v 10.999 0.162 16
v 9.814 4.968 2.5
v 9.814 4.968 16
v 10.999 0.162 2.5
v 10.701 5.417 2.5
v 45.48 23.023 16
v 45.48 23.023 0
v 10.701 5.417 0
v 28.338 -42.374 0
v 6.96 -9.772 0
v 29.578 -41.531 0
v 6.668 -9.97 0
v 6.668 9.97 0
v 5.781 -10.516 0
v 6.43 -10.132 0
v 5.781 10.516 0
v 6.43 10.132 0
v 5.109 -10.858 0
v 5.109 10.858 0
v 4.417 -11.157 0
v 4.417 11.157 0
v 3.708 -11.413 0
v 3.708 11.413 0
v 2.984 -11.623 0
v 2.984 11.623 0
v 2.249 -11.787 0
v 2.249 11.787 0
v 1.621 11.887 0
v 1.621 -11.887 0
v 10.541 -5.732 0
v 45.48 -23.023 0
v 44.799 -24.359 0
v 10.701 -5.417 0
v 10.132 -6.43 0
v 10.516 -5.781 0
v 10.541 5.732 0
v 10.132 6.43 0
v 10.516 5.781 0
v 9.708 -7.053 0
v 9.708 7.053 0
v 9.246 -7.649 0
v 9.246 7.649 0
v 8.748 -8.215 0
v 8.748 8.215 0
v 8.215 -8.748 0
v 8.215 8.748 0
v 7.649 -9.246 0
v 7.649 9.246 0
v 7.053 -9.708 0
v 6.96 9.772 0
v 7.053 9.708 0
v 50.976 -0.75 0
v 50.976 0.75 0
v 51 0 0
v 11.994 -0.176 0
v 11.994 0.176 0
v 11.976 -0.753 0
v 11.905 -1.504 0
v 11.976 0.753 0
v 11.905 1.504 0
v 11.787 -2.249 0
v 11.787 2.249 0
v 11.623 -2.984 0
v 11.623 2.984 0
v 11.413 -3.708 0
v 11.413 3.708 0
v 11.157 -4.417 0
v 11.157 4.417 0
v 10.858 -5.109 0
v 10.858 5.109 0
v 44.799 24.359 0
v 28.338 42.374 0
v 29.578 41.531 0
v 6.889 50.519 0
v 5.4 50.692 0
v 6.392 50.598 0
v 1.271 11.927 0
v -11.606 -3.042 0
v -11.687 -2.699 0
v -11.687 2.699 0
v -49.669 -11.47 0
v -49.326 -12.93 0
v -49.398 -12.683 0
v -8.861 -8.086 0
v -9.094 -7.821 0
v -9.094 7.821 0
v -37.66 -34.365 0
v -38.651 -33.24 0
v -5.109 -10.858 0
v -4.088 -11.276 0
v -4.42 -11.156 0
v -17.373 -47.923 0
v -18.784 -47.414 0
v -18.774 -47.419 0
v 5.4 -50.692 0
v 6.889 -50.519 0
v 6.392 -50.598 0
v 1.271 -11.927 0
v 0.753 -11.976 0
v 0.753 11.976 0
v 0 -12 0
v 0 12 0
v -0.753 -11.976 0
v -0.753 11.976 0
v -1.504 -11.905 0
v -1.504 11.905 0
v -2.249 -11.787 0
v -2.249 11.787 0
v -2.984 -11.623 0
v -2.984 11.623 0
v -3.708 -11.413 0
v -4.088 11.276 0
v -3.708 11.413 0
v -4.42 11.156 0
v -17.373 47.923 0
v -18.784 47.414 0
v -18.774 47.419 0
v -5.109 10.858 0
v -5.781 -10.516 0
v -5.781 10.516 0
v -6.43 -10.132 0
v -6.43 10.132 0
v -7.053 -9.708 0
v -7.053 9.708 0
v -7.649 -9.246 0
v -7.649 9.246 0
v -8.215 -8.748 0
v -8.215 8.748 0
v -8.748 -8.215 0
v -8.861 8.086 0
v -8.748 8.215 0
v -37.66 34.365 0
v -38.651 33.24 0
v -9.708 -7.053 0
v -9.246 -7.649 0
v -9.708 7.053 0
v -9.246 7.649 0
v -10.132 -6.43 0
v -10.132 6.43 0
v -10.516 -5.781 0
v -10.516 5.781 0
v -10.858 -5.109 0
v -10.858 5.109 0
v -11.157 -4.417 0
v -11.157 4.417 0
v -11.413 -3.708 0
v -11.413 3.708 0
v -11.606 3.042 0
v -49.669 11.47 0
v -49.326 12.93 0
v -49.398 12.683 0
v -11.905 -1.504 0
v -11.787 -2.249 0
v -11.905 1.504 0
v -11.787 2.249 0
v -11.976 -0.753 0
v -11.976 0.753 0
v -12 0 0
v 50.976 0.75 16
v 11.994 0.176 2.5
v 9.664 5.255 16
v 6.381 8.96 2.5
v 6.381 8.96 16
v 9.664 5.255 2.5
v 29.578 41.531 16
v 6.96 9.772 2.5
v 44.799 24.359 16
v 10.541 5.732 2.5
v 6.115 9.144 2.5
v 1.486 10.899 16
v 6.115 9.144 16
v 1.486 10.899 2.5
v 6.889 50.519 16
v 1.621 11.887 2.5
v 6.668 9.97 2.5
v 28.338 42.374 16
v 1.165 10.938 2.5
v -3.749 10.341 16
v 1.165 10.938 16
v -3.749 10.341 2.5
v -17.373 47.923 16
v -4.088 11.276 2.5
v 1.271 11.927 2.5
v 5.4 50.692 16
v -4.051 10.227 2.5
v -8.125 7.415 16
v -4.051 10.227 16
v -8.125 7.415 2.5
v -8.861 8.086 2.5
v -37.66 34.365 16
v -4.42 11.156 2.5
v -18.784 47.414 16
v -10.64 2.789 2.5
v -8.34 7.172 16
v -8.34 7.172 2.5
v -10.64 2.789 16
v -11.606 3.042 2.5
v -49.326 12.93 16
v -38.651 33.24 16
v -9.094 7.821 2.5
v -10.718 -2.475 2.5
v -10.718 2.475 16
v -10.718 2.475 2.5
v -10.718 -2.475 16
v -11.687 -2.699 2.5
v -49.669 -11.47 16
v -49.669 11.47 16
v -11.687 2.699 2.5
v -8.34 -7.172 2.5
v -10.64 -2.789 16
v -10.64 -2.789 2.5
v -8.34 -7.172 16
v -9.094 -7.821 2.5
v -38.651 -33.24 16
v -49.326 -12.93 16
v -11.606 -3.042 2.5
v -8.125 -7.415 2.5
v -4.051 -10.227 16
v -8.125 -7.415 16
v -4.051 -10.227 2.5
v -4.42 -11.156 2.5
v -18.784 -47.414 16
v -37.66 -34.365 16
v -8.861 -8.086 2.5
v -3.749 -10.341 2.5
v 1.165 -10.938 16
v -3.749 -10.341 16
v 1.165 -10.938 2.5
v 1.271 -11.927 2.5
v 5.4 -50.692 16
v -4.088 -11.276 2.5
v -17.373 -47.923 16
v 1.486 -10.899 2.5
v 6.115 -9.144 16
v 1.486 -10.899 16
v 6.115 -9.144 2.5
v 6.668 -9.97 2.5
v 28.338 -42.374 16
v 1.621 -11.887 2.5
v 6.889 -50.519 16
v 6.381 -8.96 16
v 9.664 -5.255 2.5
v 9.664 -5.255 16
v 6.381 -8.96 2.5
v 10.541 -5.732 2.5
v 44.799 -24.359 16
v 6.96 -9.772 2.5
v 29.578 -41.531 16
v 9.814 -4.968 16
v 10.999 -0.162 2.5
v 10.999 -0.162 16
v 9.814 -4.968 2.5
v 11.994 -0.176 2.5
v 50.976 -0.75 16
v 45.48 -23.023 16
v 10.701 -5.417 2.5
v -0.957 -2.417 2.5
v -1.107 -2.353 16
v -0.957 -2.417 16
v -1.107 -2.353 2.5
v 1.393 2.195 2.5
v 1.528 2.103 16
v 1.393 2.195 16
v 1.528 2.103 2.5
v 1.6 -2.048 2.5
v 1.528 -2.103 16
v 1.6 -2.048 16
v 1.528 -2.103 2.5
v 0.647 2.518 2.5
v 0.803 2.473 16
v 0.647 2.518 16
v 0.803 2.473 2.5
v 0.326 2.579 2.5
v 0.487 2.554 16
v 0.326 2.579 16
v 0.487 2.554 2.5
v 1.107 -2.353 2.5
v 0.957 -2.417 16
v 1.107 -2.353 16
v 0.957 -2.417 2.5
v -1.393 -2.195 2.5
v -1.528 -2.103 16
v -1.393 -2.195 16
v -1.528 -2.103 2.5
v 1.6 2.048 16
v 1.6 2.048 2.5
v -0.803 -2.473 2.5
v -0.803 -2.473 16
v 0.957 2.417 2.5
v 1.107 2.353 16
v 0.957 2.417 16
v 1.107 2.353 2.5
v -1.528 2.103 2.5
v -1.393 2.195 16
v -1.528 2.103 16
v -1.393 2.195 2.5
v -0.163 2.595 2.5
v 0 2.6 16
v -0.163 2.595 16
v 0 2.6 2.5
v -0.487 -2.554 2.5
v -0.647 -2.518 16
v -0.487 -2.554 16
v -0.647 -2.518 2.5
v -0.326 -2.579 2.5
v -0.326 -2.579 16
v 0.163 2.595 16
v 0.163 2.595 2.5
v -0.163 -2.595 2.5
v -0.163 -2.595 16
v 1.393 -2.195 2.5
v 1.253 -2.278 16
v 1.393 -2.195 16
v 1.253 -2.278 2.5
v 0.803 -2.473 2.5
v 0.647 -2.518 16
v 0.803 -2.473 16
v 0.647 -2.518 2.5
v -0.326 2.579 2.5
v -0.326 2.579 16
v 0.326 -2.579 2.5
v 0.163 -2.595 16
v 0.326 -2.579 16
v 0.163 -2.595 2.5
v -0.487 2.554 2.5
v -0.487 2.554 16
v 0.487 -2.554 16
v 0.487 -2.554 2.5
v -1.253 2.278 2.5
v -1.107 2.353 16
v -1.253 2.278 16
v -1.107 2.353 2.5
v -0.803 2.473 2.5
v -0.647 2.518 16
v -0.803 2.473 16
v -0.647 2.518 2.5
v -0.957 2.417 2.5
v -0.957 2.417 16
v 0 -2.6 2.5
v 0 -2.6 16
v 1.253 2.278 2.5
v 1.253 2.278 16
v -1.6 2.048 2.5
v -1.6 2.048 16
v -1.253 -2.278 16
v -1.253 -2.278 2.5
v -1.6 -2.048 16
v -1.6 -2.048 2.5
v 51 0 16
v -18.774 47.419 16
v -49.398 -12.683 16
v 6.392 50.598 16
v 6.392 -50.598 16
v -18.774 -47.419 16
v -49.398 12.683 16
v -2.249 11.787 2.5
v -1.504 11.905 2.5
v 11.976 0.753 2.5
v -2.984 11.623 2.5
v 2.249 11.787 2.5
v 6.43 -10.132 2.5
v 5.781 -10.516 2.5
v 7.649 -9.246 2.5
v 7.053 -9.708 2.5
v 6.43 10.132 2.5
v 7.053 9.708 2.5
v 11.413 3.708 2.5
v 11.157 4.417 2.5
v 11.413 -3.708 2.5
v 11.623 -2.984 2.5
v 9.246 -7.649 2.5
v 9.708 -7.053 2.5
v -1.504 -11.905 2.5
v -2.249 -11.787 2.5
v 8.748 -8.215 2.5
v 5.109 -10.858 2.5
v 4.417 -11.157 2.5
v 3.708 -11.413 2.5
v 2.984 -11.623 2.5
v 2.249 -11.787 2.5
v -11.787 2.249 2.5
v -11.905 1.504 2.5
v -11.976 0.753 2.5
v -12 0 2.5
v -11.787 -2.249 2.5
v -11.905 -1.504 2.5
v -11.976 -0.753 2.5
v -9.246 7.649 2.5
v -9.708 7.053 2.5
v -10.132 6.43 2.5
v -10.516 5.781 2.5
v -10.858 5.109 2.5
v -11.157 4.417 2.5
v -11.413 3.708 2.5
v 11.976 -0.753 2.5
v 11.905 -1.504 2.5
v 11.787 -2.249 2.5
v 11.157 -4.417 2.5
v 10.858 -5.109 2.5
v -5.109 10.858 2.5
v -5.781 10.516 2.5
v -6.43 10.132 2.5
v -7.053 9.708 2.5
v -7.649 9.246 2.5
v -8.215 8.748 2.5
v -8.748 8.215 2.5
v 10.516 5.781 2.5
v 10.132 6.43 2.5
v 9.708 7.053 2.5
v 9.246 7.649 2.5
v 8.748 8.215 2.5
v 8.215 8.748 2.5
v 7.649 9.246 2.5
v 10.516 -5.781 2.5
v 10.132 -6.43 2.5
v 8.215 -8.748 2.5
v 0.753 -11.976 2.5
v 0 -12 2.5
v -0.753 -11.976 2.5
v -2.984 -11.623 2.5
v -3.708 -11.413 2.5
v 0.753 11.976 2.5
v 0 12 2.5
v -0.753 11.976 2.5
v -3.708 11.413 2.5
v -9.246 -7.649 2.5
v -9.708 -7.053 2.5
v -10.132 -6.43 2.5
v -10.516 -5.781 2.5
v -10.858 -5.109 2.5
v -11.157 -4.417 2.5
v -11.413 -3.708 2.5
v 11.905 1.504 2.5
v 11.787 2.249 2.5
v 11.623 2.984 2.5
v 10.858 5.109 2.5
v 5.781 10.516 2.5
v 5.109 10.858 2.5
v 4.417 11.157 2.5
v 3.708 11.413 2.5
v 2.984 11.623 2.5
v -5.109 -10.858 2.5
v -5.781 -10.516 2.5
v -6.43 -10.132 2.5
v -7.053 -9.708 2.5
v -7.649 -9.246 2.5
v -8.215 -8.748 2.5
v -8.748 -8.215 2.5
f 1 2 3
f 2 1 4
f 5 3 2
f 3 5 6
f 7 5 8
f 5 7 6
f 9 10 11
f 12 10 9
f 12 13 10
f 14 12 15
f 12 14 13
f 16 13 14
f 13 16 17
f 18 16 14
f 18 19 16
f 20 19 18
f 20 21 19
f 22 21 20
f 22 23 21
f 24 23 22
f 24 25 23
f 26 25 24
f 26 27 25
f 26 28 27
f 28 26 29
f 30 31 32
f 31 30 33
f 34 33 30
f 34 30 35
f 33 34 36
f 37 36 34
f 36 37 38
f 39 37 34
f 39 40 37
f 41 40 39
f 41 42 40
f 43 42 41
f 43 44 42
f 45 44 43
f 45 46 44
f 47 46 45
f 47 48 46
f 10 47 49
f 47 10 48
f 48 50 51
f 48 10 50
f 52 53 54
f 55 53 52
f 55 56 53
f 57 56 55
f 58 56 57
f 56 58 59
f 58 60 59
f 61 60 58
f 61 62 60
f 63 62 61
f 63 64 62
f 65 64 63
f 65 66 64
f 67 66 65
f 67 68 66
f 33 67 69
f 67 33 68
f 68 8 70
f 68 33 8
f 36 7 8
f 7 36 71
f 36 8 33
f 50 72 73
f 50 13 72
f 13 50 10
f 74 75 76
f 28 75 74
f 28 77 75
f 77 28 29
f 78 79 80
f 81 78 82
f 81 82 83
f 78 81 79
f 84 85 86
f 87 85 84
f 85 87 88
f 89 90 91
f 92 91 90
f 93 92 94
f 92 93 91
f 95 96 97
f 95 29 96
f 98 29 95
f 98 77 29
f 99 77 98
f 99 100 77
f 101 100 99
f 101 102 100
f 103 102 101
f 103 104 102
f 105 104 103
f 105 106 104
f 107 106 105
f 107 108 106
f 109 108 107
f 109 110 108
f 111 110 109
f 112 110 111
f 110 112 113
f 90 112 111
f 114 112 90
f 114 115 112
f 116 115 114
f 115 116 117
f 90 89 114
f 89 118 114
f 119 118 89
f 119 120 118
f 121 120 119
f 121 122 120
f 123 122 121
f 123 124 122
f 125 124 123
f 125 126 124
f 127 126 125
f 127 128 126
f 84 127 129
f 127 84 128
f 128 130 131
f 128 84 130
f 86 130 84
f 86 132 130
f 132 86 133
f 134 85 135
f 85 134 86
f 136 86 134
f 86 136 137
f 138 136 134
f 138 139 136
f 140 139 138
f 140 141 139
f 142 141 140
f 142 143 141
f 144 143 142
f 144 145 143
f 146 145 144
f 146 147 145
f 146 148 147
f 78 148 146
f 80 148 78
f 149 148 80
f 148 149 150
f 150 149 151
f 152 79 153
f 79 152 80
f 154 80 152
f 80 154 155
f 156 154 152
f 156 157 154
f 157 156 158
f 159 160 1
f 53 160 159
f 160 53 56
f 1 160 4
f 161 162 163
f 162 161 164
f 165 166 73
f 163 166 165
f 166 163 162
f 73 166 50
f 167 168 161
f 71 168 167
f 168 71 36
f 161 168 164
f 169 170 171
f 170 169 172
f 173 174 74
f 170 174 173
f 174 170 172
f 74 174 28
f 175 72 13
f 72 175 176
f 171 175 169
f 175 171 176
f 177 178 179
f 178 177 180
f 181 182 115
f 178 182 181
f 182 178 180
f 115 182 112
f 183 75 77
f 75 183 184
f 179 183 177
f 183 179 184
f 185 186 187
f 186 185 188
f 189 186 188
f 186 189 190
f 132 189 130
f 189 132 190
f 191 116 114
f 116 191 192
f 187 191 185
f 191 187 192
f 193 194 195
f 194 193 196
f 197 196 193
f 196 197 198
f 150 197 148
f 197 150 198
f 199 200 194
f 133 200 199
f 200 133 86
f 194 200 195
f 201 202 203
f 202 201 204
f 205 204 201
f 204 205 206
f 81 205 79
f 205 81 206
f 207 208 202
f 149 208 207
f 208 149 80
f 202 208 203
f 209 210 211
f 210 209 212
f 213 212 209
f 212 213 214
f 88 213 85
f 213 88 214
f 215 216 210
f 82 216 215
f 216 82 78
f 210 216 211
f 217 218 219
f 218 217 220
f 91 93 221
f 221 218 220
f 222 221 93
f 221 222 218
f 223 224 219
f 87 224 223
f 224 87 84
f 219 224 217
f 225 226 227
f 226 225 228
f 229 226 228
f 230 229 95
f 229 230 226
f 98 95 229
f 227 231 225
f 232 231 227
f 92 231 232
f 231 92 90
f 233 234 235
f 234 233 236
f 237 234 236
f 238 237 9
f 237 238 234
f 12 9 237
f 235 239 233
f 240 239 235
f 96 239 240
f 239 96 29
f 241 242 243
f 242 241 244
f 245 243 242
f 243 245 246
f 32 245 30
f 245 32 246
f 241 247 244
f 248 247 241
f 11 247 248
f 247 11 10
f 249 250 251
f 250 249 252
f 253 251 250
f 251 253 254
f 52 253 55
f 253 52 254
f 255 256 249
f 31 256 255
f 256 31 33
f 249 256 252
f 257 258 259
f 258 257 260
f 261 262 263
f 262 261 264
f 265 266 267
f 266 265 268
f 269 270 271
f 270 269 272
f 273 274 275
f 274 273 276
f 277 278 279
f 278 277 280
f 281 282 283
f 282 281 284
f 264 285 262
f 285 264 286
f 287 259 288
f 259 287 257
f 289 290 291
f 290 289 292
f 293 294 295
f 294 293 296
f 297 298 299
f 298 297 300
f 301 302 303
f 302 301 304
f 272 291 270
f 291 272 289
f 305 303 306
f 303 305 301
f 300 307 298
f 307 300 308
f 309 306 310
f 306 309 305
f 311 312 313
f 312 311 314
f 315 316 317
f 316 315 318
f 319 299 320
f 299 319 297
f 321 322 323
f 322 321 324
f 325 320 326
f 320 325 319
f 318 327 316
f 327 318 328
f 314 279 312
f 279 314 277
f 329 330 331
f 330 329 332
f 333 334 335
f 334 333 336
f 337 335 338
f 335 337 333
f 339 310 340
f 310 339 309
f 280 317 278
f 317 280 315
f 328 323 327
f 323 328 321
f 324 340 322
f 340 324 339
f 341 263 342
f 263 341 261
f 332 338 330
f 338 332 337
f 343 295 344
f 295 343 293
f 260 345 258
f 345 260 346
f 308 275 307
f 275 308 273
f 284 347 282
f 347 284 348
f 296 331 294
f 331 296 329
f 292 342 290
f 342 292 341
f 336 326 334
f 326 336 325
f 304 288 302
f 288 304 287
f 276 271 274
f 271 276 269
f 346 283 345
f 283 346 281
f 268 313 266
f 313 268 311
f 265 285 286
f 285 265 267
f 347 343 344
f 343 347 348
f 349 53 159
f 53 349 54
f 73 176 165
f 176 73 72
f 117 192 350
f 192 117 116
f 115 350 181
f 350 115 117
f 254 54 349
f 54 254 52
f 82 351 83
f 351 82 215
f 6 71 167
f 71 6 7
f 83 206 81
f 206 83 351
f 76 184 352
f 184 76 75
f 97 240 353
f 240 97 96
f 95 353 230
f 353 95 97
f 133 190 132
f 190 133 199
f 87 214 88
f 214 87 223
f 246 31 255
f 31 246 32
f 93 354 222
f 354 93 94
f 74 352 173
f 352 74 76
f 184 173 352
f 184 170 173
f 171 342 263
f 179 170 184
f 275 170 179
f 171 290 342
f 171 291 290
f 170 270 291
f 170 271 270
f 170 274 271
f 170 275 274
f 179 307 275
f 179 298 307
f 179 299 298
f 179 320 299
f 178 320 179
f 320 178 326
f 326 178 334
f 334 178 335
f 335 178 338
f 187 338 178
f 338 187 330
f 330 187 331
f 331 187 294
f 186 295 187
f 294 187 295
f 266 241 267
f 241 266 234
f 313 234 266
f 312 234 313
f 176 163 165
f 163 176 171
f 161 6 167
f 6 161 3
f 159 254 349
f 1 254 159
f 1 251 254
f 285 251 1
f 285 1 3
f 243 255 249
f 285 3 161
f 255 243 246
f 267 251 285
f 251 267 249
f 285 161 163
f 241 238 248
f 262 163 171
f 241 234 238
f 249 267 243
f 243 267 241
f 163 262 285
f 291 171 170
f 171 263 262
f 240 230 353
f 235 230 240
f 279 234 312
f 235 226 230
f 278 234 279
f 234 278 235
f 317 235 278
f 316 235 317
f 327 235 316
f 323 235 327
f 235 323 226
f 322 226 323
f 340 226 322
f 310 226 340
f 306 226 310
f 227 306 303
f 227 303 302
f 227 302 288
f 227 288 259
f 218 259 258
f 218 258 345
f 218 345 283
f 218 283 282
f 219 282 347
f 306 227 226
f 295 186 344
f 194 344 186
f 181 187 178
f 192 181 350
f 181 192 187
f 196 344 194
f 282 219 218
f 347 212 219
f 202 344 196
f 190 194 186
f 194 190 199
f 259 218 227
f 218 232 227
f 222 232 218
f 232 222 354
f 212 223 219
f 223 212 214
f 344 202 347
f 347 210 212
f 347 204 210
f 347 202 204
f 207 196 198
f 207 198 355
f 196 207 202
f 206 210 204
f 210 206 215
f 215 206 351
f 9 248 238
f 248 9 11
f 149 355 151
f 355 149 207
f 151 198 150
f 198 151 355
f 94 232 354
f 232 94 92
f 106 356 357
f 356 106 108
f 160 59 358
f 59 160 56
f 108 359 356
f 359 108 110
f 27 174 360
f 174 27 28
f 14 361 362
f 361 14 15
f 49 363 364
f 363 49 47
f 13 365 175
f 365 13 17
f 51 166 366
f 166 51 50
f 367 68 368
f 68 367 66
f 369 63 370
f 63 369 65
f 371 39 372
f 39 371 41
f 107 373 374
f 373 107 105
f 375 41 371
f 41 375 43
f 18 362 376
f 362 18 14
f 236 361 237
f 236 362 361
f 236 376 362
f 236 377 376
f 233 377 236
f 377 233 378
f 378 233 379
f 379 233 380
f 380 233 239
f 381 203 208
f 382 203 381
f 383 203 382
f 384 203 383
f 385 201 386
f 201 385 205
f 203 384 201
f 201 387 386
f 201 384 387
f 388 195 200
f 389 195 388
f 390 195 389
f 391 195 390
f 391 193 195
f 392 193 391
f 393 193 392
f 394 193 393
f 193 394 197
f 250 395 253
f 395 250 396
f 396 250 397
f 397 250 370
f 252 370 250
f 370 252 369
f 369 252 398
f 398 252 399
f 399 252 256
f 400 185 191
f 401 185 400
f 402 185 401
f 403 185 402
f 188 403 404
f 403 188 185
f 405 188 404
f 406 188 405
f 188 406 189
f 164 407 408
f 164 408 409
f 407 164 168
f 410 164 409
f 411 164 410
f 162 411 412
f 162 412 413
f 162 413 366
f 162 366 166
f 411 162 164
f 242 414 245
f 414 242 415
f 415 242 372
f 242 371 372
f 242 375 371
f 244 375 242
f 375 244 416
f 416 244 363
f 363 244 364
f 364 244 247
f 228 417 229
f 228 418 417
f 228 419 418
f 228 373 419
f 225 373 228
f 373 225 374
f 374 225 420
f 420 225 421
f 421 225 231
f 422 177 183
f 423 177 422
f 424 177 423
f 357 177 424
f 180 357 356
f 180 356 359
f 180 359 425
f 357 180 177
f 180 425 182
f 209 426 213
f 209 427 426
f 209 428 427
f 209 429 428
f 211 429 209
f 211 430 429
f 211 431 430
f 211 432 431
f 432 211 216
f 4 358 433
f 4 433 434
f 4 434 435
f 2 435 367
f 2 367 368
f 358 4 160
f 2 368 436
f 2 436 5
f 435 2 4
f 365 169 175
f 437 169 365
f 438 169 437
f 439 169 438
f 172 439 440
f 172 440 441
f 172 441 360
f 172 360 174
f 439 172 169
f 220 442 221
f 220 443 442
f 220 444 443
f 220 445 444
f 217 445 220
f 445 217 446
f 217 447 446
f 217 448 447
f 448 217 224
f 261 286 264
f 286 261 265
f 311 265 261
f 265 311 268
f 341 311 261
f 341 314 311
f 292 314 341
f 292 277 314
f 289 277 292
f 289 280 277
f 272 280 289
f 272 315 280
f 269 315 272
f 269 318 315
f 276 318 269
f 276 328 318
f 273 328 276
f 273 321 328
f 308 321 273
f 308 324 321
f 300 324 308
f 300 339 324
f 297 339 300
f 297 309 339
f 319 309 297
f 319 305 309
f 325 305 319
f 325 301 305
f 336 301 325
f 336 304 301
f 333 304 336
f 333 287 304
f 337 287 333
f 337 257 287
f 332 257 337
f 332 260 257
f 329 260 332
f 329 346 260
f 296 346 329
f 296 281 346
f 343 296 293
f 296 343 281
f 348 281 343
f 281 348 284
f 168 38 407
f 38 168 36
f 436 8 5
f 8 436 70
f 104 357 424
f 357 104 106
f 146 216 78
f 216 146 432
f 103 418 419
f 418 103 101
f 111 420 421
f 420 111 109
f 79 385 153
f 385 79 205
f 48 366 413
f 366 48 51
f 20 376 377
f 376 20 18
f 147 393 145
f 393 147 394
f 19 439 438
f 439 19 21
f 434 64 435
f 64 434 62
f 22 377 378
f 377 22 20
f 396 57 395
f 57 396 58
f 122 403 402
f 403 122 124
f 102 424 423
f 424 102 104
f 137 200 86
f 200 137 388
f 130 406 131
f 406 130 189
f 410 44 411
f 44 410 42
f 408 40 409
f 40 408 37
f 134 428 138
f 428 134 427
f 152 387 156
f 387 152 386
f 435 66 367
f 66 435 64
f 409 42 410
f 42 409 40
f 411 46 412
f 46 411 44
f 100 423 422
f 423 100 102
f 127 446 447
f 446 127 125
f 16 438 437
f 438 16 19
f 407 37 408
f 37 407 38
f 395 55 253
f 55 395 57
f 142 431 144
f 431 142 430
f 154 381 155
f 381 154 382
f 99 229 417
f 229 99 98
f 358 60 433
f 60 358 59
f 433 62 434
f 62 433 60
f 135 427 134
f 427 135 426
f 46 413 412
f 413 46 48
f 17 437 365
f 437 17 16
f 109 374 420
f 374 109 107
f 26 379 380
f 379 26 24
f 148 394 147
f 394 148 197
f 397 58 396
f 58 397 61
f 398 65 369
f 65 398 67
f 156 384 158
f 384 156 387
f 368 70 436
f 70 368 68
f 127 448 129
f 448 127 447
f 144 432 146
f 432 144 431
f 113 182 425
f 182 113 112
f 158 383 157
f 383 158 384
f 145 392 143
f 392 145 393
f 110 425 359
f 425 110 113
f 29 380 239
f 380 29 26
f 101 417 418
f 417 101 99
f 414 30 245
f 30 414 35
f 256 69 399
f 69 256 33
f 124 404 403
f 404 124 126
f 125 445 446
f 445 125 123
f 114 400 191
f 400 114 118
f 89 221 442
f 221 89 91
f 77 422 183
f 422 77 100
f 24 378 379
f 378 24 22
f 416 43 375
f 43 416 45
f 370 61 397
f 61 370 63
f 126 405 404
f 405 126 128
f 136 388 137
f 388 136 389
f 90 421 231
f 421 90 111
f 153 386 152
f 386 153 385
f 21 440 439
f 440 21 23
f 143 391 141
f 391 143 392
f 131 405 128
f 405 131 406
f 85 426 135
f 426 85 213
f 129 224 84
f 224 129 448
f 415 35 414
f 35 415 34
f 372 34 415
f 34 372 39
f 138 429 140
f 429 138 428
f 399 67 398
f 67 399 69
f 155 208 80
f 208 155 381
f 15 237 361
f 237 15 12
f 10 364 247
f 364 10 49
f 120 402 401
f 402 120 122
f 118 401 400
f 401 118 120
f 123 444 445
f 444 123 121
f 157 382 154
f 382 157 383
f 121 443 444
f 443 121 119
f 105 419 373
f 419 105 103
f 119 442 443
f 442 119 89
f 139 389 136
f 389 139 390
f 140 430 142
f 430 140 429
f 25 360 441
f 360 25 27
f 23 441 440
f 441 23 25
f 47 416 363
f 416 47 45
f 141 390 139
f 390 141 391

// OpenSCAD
// Medify - Floor 2: The Windmail (Lowered for 1mm Clearance)
// תיקון: יצירת חיבור פיזי בין הלהבים לליבה ללא חסימת התאים
$fn = 100;

// --- פרמטרים הנדסיים ---
outer_dia = 102;      
height = 16;          
wall_thickness = 1.5; 
compartments = 13;
center_core_r = 10;   

angle_per_comp = 360 / compartments;
wall_angle = (wall_thickness * 360) / (PI * outer_dia); 
cutout_angle = angle_per_comp - wall_angle;

// שימוש ב-union כדי לוודא שכל המשטחים מולחמים יחד
union() {
    difference() {
        // 1. הגוף המרכזי
        cylinder(h = height, d = outer_dia);

        // 2. חיתוך 13 התאים
        for (i = [0 : compartments - 1]) {
            rotate([0, 0, i * angle_per_comp + wall_angle/2])
            intersection() {
                translate([0, 0, -1]) cylinder(h = height + 2, r = outer_dia/2 + 2);
                linear_extrude(height = height + 2)
                    polygon(points=[
                        // התיקון הקריטי: התחלת החיתוך ב-center_core_r + 1
                        // זה משאיר 1 מ"מ של פלסטיק רציף שמחבר את הלהבים לליבה
                        [center_core_r + 1, 0],
                        [outer_dia, 0],
                        [outer_dia * cos(cutout_angle), outer_dia * sin(cutout_angle)],
                        [(center_core_r + 1) * cos(cutout_angle), (center_core_r + 1) * sin(cutout_angle)]
                    ]);
            }
        }

        // 3. חור הציר - Double-D Shaft (למנוע 28BYJ-48)
        translate([0, 0, -1])
        intersection() {
            cylinder(h = height + 2, d = 5.2); 
            translate([0, 0, (height + 2)/2])
                cube([3.2, 10, height + 2], center = true);
        }
    }

    // 4. חיזוק רצפה במרכז (סביב הציר בלבד)
    cylinder(h = 2.5, r = center_core_r + 2);
}
